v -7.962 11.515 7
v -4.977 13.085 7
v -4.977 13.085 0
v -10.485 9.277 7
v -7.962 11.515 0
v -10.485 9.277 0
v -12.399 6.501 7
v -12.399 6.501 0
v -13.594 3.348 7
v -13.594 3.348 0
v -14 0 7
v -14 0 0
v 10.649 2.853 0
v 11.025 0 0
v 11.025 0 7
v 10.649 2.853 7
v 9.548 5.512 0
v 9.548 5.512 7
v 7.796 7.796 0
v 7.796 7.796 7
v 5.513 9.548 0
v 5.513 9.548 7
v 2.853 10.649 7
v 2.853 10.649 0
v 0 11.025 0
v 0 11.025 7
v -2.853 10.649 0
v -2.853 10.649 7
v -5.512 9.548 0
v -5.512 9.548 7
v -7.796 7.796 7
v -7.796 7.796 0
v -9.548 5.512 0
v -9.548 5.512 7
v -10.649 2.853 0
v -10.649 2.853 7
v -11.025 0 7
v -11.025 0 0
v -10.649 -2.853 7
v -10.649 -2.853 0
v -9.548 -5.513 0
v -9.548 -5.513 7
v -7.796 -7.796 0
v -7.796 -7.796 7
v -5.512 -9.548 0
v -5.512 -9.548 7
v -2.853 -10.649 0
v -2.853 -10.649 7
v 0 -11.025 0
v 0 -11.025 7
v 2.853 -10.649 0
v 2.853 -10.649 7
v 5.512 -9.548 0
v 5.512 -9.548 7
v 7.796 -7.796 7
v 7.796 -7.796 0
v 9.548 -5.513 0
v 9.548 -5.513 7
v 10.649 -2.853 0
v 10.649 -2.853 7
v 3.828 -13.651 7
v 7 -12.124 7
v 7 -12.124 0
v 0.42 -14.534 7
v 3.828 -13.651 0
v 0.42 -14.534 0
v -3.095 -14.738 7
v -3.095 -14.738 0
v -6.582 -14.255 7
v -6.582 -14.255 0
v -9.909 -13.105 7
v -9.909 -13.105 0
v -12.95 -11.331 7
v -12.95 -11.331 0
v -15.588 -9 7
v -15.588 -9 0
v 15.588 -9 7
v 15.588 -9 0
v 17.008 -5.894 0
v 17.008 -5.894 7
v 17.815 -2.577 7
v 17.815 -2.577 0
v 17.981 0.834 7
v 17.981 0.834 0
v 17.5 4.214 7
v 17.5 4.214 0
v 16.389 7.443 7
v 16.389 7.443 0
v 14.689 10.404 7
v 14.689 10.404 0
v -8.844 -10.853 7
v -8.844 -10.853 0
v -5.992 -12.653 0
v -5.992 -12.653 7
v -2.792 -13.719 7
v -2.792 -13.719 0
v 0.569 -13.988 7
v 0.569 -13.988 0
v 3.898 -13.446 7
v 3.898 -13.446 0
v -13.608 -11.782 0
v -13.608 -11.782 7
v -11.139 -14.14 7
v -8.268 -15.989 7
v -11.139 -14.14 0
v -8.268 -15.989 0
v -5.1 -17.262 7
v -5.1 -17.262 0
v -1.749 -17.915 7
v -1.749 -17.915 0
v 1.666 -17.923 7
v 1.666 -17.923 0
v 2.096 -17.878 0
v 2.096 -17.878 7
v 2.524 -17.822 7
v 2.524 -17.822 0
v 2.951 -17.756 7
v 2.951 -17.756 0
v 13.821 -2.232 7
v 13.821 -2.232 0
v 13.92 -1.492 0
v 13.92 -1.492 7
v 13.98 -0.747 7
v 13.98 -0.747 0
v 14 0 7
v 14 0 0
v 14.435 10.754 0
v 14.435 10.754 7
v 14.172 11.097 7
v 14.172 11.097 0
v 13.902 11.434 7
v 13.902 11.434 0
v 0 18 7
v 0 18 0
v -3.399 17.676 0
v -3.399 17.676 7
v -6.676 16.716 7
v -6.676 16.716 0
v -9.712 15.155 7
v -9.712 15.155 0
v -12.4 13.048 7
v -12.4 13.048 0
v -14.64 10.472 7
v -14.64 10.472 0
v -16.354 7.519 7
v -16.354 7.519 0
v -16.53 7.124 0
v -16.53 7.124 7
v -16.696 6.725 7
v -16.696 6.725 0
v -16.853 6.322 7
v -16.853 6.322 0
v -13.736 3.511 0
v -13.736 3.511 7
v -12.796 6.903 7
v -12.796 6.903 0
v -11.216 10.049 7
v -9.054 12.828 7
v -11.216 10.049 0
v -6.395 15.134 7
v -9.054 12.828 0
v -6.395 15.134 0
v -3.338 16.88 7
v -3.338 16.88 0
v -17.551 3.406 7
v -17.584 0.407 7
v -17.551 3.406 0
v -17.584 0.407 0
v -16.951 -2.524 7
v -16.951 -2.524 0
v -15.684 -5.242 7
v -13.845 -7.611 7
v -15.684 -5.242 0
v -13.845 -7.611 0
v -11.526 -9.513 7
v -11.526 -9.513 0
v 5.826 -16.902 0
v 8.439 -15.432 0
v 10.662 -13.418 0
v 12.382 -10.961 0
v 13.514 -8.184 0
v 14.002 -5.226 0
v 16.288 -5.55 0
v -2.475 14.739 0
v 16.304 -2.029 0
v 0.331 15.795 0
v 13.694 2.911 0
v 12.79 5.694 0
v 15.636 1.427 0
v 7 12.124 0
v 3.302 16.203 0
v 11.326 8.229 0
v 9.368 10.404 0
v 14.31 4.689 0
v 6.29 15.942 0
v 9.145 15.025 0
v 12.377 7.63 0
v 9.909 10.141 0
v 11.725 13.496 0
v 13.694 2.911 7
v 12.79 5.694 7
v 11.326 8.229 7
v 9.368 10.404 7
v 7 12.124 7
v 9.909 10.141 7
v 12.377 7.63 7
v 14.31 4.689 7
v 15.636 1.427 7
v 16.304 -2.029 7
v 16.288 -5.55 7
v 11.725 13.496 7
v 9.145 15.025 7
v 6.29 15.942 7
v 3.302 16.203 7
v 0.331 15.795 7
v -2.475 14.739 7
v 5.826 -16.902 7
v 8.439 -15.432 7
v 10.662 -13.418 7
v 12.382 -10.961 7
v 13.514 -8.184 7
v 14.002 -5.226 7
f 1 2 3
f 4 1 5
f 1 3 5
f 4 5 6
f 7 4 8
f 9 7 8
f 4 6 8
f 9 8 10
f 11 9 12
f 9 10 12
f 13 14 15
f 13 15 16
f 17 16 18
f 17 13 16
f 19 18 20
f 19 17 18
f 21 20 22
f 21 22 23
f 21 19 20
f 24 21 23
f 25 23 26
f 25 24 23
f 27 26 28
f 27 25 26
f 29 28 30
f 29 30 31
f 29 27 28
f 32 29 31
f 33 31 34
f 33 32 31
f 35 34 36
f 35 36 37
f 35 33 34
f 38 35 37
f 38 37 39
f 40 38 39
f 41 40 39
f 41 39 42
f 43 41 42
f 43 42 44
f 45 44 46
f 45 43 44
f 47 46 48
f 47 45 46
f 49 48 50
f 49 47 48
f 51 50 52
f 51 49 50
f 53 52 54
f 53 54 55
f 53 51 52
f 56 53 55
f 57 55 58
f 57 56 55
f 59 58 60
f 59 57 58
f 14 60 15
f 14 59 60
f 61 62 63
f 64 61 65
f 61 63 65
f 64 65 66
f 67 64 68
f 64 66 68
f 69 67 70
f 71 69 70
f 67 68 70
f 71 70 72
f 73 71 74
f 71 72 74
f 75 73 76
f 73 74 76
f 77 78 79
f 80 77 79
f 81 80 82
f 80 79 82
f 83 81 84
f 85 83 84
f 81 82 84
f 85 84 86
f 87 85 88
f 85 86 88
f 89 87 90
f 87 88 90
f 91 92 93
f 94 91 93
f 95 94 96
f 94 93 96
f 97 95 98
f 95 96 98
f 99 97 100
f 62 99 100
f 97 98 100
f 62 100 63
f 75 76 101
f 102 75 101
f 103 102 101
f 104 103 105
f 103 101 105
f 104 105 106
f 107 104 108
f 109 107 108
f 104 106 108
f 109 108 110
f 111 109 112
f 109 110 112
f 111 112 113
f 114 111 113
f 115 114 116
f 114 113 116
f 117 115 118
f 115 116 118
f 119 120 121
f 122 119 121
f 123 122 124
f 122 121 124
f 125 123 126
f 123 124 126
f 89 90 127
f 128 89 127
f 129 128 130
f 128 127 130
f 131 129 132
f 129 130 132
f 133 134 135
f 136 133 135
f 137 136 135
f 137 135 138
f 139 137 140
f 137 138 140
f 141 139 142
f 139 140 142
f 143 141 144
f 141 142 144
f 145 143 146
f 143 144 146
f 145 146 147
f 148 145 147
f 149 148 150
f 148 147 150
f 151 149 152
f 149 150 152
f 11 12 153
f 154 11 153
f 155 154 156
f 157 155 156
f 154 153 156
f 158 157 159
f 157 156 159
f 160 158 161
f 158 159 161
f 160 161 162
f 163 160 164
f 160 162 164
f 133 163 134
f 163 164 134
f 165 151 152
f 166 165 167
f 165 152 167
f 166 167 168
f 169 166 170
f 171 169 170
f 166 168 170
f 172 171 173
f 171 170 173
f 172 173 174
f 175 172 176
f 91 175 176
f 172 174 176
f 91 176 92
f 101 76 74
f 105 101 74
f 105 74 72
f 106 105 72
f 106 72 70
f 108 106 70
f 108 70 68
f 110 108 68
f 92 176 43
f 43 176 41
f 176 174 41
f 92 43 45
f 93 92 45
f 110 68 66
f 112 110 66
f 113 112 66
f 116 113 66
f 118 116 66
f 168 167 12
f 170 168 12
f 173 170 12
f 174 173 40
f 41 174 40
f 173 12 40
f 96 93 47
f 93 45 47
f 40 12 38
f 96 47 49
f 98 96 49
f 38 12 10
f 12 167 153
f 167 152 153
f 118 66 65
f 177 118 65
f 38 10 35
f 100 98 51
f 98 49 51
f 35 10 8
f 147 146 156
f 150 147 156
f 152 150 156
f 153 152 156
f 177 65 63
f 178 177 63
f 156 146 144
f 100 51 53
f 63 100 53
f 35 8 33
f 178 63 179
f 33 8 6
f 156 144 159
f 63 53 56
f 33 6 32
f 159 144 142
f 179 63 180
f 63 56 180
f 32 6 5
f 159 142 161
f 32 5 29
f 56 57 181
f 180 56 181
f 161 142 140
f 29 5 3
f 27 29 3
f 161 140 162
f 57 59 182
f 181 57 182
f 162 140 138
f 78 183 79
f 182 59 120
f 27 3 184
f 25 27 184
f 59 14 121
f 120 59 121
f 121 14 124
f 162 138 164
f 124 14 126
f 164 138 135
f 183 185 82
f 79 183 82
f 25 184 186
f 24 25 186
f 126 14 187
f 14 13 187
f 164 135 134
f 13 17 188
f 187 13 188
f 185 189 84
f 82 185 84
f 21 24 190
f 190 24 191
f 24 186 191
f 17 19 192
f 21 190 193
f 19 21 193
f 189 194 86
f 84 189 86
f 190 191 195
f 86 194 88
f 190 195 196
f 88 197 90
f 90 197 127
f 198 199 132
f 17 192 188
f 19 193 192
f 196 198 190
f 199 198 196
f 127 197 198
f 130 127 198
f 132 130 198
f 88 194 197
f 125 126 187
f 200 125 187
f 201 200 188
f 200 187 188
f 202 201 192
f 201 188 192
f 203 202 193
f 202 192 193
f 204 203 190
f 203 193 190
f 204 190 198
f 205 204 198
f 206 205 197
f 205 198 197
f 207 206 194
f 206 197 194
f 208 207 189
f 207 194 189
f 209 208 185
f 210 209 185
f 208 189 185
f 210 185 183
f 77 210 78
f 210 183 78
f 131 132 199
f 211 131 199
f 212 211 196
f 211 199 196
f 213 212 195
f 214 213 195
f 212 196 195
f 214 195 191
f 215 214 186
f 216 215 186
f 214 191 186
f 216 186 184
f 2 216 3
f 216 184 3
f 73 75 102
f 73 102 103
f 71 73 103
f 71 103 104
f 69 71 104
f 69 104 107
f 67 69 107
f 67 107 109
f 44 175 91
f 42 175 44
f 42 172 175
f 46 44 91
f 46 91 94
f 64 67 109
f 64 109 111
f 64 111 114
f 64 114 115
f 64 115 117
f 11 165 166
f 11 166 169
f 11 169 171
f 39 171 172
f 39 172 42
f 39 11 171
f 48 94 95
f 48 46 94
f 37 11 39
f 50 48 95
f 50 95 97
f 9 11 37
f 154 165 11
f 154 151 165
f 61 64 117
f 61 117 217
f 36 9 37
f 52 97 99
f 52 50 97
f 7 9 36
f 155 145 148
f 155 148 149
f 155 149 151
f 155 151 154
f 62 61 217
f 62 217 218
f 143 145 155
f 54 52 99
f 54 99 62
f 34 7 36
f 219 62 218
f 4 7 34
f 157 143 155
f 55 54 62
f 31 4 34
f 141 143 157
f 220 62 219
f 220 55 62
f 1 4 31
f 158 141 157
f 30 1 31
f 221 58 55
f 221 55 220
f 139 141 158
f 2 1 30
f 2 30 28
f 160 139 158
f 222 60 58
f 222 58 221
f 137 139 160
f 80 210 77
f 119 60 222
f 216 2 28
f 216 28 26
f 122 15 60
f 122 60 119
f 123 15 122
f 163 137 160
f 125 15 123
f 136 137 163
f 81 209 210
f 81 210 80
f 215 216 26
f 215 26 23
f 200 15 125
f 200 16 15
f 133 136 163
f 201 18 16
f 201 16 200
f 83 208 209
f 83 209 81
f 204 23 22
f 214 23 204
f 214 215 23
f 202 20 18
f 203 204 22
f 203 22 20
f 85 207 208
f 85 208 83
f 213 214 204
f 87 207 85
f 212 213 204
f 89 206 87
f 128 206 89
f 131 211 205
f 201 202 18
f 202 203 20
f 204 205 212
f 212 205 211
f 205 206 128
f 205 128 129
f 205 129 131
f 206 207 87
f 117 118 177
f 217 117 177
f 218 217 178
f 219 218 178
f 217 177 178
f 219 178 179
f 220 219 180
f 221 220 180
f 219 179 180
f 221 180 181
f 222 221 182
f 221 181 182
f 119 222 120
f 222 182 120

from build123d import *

# Parameters (mm, degrees)
F0_R     = 11.025
F1_DEPTH = 7


with BuildPart() as f1:
    # F0 (on Top) → F1 (new body)
    with BuildSketch(Plane.XY):
        with BuildLine():
            ThreePointArc((13.820918, -2.232092), (13.955158, -1.119632), (14, 0))
            ThreePointArc((14, 0), (12.124356, 7), (7, 12.124356))
            ThreePointArc((7, 12.124356), (1.119632, 13.955158), (-4.977411, 13.085312))
            ThreePointArc((-4.977411, 13.085312), (-11.525705, 7.947209), (-14, 0))
            ThreePointArc((-14, 0), (-12.645337, -6.007949), (-8.843507, -10.85322))
            ThreePointArc((-8.843507, -10.85322), (-1.119632, -13.955158), (7, -12.124356))
            ThreePointArc((7, -12.124356), (11.525705, -7.947209), (13.820918, -2.232092))
        make_face()
        Circle(F0_R, mode=Mode.SUBTRACT)
        with BuildLine():
            ThreePointArc((-8.843507, -10.85322), (-12.645337, -6.007949), (-14, 0))
            ThreePointArc((-14, 0), (-10.202934, 11.491171), (0, 18))
            ThreePointArc((0, 18), (-9.712436, 15.154821), (-16.35447, 7.518732))
            ThreePointArc((-16.35447, 7.518732), (-16.614557, 6.925063), (-16.853102, 6.322416))
            ThreePointArc((-16.853102, 6.322416), (-16.393457, -3.91863), (-8.843507, -10.85322))
        make_face()
        with BuildLine():
            ThreePointArc((-4.977411, 13.085312), (1.119632, 13.955158), (7, 12.124356))
            ThreePointArc((7, 12.124356), (15.053113, 3.090415), (15.588457, -9))
            ThreePointArc((15.588457, -9), (17.980678, 0.833806), (14.688647, 10.40402))
            ThreePointArc((14.688647, 10.40402), (14.304559, 10.926097), (13.901924, 11.434007))
            ThreePointArc((13.901924, 11.434007), (4.803096, 16.156465), (-4.977411, 13.085312))
        make_face()
        with BuildLine():
            ThreePointArc((2.951178, -17.756423), (11.590361, -12.237835), (13.820918, -2.232092))
            ThreePointArc((13.820918, -2.232092), (11.525705, -7.947209), (7, -12.124356))
            ThreePointArc((7, -12.124356), (-4.850179, -14.581586), (-15.588457, -9))
            ThreePointArc((-15.588457, -9), (-8.268242, -15.988627), (1.665822, -17.922752))
            ThreePointArc((1.665822, -17.922752), (2.309998, -17.85116), (2.951178, -17.756423))
        make_face()
    extrude(amount=F1_DEPTH)


solid = f1.part
